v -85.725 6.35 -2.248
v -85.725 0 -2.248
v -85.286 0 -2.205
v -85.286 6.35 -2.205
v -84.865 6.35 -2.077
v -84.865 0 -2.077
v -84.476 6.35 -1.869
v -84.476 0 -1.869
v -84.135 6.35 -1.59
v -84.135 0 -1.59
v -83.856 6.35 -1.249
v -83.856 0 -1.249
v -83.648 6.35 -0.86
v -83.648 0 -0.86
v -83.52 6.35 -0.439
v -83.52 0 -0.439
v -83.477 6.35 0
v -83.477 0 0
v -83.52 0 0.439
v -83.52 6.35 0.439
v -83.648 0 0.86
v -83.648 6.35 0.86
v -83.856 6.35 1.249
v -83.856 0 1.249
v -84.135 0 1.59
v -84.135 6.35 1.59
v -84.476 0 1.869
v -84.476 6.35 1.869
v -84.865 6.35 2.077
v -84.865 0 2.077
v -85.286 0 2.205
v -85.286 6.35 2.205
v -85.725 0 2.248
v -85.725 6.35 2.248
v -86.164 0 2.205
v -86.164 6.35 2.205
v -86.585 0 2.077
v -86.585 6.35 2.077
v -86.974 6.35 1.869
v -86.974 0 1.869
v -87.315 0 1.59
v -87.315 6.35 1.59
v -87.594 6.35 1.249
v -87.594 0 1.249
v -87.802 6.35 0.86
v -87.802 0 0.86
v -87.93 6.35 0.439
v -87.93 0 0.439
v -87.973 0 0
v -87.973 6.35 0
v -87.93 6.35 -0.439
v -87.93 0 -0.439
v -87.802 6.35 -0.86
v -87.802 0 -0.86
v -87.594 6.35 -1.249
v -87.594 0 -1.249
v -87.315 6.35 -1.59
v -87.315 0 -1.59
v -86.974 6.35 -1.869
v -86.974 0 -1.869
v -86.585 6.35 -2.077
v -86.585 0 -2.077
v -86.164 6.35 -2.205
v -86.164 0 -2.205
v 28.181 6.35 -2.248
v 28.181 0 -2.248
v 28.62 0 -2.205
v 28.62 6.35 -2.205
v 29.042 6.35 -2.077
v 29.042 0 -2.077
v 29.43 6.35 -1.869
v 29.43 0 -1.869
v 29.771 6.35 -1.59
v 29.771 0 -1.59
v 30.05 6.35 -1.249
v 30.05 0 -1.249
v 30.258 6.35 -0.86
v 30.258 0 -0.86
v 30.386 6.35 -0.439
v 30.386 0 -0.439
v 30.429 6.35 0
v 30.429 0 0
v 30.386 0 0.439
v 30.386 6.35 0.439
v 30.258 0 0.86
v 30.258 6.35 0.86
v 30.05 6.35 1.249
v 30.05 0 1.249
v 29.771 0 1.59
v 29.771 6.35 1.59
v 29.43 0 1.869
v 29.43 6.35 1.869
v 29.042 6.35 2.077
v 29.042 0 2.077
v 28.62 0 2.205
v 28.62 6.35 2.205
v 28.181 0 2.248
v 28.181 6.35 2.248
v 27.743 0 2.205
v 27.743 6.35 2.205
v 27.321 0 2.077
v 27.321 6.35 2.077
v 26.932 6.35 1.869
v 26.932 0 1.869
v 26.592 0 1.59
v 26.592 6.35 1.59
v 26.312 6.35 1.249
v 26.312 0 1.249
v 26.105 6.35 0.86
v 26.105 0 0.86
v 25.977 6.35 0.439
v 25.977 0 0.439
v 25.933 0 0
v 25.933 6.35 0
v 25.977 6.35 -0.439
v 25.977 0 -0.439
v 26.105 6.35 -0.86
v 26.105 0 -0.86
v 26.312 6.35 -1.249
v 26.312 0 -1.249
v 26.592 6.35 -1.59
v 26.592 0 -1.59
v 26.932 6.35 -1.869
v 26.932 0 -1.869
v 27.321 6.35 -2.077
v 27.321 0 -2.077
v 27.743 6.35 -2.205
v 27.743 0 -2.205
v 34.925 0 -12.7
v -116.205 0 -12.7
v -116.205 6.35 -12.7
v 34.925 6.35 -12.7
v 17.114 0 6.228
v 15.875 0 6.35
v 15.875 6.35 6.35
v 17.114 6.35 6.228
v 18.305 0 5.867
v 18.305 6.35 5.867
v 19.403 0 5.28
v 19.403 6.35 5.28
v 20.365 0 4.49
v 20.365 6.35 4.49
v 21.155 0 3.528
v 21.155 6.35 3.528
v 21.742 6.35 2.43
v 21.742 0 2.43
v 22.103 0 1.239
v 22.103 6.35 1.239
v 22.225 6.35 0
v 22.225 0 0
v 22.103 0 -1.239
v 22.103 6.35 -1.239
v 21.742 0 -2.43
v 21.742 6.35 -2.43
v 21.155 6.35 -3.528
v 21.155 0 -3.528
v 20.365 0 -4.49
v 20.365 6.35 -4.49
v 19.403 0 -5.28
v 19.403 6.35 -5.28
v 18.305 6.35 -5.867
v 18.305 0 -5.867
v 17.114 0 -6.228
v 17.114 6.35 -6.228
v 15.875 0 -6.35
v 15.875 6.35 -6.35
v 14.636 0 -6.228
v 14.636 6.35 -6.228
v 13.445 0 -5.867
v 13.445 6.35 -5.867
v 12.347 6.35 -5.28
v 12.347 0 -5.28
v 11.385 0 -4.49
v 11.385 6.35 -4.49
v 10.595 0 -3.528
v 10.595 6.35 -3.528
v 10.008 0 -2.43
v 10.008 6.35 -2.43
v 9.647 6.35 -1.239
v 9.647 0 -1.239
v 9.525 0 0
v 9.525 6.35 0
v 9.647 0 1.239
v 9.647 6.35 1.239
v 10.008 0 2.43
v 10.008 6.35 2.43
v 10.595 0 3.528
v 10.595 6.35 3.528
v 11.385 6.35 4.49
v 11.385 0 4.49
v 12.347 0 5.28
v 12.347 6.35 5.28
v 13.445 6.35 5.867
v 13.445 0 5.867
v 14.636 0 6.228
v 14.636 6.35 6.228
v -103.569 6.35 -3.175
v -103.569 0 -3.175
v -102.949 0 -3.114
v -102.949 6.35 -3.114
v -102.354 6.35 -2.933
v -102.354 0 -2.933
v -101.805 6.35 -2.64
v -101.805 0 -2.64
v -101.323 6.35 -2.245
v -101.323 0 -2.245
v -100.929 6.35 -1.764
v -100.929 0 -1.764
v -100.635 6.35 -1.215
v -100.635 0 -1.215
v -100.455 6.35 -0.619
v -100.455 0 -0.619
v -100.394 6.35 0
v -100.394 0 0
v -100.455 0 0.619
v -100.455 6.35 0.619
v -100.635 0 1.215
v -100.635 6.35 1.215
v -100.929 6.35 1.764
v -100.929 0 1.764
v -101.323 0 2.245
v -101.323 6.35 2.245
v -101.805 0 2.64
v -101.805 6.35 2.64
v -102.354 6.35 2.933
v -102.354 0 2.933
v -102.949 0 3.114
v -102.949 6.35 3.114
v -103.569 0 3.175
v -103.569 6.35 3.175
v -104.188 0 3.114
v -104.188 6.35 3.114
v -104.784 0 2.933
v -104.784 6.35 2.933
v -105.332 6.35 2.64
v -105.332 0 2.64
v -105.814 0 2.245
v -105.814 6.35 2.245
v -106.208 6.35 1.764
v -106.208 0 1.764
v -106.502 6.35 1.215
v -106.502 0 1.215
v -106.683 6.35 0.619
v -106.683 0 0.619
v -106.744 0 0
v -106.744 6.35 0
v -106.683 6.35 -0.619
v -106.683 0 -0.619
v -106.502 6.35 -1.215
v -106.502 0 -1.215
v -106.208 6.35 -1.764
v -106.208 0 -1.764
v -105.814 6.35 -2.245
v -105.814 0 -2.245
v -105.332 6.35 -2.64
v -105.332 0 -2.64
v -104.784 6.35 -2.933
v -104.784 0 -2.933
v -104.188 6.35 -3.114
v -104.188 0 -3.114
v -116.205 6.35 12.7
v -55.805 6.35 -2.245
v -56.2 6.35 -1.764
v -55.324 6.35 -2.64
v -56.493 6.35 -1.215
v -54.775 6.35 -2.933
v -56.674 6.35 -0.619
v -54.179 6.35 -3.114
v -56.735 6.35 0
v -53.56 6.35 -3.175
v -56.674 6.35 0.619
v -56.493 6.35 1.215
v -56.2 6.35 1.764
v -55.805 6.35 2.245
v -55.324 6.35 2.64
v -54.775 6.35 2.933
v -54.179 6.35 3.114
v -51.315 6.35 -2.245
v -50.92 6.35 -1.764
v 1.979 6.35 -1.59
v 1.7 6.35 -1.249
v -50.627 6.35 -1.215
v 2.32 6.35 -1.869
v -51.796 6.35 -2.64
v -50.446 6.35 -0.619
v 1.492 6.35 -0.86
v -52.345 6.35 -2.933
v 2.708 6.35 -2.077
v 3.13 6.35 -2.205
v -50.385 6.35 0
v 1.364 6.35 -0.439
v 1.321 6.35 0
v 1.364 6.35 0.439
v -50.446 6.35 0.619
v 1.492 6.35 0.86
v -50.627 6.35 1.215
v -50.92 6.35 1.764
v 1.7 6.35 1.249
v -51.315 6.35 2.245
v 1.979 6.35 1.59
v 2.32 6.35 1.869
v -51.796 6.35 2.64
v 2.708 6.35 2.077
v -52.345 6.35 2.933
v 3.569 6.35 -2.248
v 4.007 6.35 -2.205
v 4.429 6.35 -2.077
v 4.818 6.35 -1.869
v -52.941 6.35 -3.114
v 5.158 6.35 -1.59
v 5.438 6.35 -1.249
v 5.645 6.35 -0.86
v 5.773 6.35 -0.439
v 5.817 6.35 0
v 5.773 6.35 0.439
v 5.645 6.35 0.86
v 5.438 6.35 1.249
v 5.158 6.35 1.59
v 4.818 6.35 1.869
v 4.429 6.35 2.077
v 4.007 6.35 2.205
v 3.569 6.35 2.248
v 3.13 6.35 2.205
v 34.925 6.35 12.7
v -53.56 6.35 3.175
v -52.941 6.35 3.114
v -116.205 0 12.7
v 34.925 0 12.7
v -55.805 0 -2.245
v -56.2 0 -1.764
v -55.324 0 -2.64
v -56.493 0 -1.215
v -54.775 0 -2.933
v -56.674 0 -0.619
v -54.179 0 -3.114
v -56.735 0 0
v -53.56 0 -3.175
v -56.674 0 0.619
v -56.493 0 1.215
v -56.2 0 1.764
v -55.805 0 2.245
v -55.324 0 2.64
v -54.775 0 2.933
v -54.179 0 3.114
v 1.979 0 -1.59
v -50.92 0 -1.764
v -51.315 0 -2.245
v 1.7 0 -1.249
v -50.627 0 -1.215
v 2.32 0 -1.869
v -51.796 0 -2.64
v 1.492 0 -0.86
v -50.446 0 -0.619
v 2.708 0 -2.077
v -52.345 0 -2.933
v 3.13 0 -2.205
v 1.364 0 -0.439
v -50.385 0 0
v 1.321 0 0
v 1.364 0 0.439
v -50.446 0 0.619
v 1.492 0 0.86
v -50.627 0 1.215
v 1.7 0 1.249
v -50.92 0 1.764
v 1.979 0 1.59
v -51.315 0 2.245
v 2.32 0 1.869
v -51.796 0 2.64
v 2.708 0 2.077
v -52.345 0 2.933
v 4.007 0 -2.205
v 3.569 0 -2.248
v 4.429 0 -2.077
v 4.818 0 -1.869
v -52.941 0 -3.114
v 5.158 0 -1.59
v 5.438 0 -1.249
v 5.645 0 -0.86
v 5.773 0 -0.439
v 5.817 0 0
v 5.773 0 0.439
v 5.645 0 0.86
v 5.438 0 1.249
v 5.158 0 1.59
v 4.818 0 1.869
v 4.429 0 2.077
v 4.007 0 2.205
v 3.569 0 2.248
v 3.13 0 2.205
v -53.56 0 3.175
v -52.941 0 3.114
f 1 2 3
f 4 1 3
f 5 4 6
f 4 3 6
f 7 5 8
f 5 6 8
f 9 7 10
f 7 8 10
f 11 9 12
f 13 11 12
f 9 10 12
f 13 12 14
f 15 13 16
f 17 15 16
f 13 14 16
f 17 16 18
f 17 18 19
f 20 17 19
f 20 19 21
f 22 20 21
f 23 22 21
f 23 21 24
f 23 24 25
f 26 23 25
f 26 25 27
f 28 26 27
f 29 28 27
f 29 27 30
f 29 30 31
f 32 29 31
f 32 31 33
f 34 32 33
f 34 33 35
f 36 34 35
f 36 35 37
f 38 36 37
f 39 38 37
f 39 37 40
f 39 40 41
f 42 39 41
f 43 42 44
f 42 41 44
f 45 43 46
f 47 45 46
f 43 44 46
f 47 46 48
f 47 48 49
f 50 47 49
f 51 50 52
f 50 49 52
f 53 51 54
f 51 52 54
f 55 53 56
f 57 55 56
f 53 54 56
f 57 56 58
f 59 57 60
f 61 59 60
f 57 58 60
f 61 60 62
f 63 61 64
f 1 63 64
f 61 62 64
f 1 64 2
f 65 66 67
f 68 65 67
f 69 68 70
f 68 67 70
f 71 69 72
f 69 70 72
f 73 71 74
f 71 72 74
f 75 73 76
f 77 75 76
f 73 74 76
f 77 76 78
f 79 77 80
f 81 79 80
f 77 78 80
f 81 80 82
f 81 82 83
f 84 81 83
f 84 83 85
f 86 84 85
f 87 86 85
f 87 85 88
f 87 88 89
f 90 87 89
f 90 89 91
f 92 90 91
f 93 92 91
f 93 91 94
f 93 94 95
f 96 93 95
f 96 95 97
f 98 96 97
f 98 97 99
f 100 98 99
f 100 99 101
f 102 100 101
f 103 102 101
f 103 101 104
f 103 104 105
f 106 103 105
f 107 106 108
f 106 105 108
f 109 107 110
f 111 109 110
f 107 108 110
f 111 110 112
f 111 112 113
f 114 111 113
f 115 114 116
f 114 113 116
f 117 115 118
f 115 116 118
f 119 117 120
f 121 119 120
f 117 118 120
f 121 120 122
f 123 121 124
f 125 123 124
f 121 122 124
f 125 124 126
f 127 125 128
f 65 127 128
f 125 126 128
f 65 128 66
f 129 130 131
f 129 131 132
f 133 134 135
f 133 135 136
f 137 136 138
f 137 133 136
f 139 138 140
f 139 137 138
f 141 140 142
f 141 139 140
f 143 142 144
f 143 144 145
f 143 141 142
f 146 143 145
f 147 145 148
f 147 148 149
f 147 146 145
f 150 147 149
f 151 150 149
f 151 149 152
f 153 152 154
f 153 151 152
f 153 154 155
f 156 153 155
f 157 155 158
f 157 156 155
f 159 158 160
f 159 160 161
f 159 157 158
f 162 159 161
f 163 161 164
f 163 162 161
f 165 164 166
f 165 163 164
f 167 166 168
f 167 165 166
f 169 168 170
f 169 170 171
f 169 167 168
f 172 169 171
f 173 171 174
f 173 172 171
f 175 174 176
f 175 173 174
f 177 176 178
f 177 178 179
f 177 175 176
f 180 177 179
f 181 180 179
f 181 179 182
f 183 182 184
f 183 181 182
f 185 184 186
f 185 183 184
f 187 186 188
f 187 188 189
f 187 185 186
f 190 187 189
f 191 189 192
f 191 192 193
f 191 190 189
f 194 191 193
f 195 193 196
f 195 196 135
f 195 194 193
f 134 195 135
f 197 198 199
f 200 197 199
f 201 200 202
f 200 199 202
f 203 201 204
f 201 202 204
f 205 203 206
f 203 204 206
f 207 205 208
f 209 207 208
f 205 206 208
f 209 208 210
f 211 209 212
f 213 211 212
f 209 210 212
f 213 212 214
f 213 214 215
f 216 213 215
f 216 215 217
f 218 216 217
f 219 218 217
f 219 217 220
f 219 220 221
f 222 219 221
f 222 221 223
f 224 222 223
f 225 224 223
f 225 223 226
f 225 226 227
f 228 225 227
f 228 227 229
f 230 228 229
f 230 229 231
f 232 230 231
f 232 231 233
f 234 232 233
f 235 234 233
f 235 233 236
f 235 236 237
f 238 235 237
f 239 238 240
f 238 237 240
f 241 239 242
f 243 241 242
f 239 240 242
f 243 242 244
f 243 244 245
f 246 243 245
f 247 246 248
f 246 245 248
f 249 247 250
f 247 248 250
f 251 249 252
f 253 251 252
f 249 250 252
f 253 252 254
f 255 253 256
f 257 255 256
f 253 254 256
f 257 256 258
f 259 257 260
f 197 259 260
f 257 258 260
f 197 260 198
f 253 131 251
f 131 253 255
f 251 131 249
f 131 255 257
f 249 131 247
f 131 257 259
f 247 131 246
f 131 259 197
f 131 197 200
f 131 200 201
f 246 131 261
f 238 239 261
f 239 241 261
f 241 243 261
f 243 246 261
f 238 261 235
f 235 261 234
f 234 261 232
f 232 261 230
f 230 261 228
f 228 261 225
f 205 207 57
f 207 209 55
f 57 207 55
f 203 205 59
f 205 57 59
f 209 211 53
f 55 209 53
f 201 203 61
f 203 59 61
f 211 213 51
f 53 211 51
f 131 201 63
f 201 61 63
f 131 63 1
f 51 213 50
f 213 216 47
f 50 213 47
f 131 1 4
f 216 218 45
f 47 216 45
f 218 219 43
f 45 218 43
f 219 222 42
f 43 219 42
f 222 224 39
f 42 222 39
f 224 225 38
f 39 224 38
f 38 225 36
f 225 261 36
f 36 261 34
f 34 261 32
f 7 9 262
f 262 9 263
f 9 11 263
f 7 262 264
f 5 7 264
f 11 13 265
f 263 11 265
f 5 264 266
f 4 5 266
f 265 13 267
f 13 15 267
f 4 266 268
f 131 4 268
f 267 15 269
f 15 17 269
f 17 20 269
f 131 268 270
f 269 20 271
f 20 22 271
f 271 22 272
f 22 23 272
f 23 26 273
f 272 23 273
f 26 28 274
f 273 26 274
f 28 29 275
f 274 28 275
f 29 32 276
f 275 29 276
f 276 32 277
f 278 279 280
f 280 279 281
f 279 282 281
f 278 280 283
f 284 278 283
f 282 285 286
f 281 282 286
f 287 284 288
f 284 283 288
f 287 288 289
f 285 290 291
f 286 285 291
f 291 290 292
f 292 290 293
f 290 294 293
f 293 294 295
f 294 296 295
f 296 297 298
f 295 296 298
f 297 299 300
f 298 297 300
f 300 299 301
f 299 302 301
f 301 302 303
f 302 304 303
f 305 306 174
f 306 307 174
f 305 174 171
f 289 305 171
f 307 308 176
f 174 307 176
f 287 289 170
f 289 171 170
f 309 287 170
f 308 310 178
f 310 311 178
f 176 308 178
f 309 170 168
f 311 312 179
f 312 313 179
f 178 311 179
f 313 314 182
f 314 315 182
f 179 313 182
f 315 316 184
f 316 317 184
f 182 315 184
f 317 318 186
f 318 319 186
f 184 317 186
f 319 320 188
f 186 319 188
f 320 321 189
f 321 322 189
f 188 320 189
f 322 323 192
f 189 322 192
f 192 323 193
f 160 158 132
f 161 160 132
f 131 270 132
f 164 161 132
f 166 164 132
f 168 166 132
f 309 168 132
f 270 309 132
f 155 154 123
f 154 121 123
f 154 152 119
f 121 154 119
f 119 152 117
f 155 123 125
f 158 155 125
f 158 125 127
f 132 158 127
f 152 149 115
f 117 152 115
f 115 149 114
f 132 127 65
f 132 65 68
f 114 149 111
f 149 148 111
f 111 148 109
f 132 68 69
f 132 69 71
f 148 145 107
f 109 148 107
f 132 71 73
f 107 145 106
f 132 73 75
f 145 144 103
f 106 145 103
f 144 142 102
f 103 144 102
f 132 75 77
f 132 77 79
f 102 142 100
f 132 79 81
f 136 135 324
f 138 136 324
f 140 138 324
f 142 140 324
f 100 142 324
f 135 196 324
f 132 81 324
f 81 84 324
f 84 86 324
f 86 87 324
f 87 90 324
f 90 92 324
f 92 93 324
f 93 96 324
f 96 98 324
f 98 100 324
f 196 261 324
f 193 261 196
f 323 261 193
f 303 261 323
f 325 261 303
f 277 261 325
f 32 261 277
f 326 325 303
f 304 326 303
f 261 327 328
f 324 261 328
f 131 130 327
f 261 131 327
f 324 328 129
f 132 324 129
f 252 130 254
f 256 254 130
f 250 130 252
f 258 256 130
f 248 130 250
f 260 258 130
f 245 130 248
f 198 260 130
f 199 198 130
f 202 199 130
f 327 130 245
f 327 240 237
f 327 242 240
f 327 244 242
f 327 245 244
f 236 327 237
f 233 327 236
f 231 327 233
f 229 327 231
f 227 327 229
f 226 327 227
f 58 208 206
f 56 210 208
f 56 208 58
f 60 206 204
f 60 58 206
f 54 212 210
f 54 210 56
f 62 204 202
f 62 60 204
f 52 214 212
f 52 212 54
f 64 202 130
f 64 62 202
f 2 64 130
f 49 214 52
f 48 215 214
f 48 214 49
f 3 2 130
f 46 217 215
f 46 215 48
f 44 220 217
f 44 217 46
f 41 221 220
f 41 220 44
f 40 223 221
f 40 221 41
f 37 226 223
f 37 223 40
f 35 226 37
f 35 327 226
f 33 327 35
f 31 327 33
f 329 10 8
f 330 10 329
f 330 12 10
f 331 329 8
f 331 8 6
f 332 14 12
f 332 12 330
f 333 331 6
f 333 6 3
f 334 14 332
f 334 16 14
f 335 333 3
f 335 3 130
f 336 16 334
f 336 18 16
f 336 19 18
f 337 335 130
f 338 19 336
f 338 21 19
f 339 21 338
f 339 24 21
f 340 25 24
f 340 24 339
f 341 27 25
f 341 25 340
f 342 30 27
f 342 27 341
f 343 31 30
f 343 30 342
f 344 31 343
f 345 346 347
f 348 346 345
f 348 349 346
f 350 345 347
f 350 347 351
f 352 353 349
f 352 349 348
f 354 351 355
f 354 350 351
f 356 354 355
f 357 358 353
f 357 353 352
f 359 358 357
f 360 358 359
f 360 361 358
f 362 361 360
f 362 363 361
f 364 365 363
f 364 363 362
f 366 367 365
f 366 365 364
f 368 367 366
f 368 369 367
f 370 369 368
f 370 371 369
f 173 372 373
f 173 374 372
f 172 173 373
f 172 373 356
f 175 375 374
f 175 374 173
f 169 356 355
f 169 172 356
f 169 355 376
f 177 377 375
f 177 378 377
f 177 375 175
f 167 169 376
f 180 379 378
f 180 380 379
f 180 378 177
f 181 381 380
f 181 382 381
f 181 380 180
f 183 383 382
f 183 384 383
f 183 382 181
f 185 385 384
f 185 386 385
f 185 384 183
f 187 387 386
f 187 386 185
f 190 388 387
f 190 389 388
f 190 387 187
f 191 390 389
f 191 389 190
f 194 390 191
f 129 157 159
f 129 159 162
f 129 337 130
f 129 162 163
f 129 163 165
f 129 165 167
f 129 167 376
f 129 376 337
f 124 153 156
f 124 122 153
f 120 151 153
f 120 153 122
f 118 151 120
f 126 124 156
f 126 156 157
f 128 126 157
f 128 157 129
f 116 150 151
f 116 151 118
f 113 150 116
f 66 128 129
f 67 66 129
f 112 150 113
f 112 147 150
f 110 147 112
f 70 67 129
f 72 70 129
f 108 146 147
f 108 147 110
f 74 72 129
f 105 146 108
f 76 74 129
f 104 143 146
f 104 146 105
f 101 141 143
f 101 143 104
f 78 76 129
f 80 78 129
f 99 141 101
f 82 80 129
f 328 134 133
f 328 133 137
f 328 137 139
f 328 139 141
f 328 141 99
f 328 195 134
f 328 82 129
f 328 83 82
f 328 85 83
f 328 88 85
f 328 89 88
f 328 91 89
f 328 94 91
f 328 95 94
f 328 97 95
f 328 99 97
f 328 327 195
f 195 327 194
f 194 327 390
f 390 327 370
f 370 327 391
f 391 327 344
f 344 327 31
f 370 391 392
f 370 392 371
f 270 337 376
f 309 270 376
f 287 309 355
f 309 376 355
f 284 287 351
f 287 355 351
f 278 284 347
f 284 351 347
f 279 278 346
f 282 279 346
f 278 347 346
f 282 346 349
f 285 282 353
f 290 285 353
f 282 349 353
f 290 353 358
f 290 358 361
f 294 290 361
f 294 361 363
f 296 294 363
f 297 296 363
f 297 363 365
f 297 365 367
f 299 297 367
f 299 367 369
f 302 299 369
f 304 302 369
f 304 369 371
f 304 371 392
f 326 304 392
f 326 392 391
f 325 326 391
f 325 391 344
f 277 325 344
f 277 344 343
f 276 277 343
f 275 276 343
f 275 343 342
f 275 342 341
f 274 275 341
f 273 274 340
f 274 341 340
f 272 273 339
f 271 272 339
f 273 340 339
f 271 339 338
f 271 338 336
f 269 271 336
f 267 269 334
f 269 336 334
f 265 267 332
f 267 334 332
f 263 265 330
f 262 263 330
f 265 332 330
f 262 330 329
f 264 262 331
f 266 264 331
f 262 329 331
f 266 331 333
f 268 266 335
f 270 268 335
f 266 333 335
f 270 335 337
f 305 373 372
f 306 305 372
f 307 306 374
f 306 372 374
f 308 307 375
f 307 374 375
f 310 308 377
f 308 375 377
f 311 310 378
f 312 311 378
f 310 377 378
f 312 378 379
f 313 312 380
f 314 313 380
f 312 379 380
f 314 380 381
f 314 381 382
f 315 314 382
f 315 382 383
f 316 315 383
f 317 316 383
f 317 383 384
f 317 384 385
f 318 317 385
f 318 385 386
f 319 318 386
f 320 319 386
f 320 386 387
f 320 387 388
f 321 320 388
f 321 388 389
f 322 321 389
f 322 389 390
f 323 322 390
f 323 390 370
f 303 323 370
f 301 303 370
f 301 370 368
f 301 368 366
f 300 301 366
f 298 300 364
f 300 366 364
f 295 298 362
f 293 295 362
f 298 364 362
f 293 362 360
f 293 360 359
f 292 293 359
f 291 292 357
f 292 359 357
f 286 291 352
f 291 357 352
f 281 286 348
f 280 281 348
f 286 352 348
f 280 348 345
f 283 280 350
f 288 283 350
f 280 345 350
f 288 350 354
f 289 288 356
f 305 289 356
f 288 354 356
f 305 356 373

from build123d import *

# Parameters (mm, degrees)
SKETCH1_W           = 69.85
SKETCH1_H           = 25.4
SKETCH1_R           = 6.35
BOSS_EXTRUDE1_DEPTH = 6.35
SKETCH3_W           = 81.28
SKETCH3_H           = 25.4
BOSS_EXTRUDE2_DEPTH = 6.35
SKETCH4_R           = 3.175
SKETCH4_R_2         = 2.2479
CUT_EXTRUDE2_DEPTH  = 118.069272335
SKETCH5_R           = 2.2479
CUT_EXTRUDE3_DEPTH  = 118.069272335


with BuildPart() as part:
    # Sketch1 → Boss-Extrude1 (new body)
    with BuildSketch(Plane(origin=(0, 0, 0), x_dir=(1, 0, 0), z_dir=(0, 1, 0))):
        Rectangle(SKETCH1_W, SKETCH1_H)
        with Locations(Location((15.875, 0, 0), (0, 0, 270))):
            Circle(SKETCH1_R, mode=Mode.SUBTRACT)
    extrude(amount=BOSS_EXTRUDE1_DEPTH)

    # Sketch3 → Boss-Extrude2 (add)
    with BuildSketch(Plane.XZ):
        with Locations((-75.565, 0)):
            Rectangle(SKETCH3_W, SKETCH3_H)
    extrude(amount=-BOSS_EXTRUDE2_DEPTH)

    # Sketch4 → Cut-Extrude2 (cut, through all)
    with BuildSketch(Plane.XZ):
        with Locations(Location((-53.55992209, 0, 0), (0, 0, 270))):
            Circle(SKETCH4_R)
        with Locations(Location((-85.725, 0, 0), (0, 0, 270))):
            Circle(SKETCH4_R_2)
        with Locations(Location((-103.5685508, 0, 0), (0, 0, 270))):
            Circle(SKETCH4_R)
    extrude(amount=-CUT_EXTRUDE2_DEPTH, mode=Mode.SUBTRACT)

    # Sketch5 → Cut-Extrude3 (cut, through all)
    with BuildSketch(Plane.XZ):
        with Locations(Location((28.1813, 0, 0), (0, 0, 270))):
            Circle(SKETCH5_R)
        with Locations(Location((3.5687, 0, 0), (0, 0, 270))):
            Circle(SKETCH5_R)
    extrude(amount=-CUT_EXTRUDE3_DEPTH, mode=Mode.SUBTRACT)


solid = part.part
